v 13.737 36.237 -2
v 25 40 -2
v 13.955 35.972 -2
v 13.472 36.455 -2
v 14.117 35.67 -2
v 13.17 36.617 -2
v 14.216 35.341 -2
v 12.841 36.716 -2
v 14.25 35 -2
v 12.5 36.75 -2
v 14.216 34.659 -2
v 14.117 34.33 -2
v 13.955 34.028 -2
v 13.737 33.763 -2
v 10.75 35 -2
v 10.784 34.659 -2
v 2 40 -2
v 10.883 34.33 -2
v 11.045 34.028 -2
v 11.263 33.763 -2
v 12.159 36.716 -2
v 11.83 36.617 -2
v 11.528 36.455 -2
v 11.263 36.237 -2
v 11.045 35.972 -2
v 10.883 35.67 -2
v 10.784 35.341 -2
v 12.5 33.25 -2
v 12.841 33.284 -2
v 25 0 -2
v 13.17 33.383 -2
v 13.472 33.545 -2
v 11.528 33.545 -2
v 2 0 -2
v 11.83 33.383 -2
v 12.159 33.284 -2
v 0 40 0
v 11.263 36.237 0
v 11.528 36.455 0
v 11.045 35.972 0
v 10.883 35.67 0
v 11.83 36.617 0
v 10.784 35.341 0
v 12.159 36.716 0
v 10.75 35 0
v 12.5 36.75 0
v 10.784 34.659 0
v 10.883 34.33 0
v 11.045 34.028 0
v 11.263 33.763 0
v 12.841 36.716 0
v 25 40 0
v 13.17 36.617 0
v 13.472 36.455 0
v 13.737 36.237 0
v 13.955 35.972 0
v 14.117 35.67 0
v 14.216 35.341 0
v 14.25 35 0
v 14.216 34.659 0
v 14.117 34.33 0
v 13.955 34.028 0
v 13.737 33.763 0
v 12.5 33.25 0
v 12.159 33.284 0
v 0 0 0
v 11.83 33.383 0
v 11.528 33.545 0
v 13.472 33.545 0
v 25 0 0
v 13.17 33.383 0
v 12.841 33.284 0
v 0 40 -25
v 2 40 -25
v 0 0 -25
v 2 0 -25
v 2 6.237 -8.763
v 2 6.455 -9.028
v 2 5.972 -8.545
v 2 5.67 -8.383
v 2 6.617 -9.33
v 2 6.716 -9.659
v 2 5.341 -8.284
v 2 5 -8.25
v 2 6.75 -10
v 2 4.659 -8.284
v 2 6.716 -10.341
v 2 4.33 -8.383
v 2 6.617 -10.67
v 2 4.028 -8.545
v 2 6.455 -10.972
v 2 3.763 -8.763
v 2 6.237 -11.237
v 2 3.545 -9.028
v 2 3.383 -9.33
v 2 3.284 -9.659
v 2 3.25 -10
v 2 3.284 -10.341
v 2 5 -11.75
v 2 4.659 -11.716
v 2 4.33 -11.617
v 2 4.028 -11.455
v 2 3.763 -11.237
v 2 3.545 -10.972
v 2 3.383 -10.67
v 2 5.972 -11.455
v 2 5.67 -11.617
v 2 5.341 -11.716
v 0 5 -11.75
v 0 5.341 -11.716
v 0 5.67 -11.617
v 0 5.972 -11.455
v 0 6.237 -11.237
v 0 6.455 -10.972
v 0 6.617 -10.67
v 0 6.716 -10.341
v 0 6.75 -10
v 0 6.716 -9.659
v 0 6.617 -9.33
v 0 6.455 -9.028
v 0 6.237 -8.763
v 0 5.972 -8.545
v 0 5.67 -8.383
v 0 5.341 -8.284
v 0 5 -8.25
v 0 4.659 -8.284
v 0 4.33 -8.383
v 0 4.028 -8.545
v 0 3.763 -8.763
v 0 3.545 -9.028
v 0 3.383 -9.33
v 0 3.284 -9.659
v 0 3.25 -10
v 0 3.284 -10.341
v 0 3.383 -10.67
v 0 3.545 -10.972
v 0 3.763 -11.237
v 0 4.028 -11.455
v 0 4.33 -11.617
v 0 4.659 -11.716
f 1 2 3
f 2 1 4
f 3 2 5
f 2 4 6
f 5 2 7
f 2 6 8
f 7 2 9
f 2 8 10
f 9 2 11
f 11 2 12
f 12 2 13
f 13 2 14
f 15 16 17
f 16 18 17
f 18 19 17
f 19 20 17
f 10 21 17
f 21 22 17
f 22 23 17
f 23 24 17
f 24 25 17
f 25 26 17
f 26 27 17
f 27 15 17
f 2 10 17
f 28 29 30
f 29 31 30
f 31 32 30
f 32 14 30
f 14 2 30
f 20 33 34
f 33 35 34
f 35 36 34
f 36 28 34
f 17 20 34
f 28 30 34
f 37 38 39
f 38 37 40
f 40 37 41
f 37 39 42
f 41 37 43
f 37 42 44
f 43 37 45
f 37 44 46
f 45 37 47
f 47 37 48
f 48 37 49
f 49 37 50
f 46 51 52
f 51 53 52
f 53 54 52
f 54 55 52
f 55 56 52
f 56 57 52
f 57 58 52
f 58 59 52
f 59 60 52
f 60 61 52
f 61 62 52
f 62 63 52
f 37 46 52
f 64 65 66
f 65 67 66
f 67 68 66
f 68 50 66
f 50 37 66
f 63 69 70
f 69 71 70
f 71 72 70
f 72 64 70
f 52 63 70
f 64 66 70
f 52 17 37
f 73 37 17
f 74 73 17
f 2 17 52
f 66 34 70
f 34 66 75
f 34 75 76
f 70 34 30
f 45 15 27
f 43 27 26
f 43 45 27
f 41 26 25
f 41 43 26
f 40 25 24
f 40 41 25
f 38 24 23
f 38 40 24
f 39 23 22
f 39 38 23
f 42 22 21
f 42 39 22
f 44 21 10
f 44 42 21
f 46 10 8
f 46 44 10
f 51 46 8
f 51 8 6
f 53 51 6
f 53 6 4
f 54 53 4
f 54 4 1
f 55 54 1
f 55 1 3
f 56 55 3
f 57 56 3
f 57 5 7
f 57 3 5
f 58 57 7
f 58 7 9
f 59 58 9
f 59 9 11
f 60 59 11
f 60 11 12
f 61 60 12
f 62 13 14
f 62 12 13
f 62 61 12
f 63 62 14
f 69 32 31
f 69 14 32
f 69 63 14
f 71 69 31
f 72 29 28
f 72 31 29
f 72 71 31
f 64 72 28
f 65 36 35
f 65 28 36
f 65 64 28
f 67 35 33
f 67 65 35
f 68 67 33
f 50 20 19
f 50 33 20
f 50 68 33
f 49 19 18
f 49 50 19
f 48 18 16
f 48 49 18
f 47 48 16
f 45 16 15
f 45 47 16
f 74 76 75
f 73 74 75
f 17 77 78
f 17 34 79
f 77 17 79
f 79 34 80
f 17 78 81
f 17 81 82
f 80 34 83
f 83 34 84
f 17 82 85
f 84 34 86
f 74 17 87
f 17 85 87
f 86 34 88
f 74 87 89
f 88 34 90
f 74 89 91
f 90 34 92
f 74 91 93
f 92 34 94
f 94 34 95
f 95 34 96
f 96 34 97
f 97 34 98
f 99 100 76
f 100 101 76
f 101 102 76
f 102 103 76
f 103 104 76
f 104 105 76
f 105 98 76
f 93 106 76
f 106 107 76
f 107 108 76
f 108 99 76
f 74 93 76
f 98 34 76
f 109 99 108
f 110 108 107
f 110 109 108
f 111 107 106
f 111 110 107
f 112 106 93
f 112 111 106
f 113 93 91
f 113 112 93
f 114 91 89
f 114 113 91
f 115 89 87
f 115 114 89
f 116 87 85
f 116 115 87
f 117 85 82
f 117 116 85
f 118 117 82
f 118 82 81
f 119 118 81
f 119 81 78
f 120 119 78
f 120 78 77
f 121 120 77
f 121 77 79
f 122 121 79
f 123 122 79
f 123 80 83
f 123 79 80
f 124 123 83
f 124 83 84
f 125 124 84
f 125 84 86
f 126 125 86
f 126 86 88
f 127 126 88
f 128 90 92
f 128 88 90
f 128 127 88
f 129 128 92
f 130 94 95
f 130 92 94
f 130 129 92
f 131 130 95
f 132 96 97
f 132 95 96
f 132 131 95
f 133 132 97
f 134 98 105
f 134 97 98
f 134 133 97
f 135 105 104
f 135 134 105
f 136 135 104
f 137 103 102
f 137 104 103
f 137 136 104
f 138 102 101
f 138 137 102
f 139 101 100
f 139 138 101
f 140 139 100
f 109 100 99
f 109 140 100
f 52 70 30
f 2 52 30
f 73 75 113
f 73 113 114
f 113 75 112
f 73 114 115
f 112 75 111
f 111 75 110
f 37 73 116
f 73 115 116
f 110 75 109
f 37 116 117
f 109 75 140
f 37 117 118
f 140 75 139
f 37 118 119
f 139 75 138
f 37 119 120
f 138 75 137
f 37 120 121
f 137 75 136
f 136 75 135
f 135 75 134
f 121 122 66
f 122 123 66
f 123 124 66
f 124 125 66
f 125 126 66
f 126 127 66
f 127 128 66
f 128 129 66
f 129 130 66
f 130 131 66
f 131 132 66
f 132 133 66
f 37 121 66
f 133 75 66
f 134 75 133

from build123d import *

# Parameters (mm, degrees)
BOSS_EXTRUDE1_DEPTH = 40
SKETCH2_R           = 1.75
CUT_EXTRUDE1_DEPTH  = 50
SKETCH3_R           = 1.75
CUT_EXTRUDE2_DEPTH  = 50


with BuildPart() as part:
    # Sketch1 → Boss-Extrude1 (new body)
    with BuildSketch(Plane(origin=(0, 0, 0), x_dir=(1, 0, 0), z_dir=(0, 1, 0))):
        Polygon((0, 0), (25, 0), (25, 2), (2, 2), (2, 25), (0, 25), align=None)
    extrude(amount=BOSS_EXTRUDE1_DEPTH)

    # Sketch2 → Cut-Extrude1 (cut)
    with BuildSketch(Plane(origin=(0, 0, 0), x_dir=(0, 0, -1), z_dir=(1, 0, 0))):
        with Locations((10, 5)):
            Circle(SKETCH2_R)
    extrude(amount=CUT_EXTRUDE1_DEPTH, mode=Mode.SUBTRACT)

    # Sketch3 → Cut-Extrude2 (cut)
    with BuildSketch(Plane(origin=(0, 0, 0), x_dir=(-1, 0, 0), z_dir=(0, 0, -1))):
        with Locations((-12.5, 35)):
            Circle(SKETCH3_R)
    extrude(amount=CUT_EXTRUDE2_DEPTH, mode=Mode.SUBTRACT)


solid = part.part
